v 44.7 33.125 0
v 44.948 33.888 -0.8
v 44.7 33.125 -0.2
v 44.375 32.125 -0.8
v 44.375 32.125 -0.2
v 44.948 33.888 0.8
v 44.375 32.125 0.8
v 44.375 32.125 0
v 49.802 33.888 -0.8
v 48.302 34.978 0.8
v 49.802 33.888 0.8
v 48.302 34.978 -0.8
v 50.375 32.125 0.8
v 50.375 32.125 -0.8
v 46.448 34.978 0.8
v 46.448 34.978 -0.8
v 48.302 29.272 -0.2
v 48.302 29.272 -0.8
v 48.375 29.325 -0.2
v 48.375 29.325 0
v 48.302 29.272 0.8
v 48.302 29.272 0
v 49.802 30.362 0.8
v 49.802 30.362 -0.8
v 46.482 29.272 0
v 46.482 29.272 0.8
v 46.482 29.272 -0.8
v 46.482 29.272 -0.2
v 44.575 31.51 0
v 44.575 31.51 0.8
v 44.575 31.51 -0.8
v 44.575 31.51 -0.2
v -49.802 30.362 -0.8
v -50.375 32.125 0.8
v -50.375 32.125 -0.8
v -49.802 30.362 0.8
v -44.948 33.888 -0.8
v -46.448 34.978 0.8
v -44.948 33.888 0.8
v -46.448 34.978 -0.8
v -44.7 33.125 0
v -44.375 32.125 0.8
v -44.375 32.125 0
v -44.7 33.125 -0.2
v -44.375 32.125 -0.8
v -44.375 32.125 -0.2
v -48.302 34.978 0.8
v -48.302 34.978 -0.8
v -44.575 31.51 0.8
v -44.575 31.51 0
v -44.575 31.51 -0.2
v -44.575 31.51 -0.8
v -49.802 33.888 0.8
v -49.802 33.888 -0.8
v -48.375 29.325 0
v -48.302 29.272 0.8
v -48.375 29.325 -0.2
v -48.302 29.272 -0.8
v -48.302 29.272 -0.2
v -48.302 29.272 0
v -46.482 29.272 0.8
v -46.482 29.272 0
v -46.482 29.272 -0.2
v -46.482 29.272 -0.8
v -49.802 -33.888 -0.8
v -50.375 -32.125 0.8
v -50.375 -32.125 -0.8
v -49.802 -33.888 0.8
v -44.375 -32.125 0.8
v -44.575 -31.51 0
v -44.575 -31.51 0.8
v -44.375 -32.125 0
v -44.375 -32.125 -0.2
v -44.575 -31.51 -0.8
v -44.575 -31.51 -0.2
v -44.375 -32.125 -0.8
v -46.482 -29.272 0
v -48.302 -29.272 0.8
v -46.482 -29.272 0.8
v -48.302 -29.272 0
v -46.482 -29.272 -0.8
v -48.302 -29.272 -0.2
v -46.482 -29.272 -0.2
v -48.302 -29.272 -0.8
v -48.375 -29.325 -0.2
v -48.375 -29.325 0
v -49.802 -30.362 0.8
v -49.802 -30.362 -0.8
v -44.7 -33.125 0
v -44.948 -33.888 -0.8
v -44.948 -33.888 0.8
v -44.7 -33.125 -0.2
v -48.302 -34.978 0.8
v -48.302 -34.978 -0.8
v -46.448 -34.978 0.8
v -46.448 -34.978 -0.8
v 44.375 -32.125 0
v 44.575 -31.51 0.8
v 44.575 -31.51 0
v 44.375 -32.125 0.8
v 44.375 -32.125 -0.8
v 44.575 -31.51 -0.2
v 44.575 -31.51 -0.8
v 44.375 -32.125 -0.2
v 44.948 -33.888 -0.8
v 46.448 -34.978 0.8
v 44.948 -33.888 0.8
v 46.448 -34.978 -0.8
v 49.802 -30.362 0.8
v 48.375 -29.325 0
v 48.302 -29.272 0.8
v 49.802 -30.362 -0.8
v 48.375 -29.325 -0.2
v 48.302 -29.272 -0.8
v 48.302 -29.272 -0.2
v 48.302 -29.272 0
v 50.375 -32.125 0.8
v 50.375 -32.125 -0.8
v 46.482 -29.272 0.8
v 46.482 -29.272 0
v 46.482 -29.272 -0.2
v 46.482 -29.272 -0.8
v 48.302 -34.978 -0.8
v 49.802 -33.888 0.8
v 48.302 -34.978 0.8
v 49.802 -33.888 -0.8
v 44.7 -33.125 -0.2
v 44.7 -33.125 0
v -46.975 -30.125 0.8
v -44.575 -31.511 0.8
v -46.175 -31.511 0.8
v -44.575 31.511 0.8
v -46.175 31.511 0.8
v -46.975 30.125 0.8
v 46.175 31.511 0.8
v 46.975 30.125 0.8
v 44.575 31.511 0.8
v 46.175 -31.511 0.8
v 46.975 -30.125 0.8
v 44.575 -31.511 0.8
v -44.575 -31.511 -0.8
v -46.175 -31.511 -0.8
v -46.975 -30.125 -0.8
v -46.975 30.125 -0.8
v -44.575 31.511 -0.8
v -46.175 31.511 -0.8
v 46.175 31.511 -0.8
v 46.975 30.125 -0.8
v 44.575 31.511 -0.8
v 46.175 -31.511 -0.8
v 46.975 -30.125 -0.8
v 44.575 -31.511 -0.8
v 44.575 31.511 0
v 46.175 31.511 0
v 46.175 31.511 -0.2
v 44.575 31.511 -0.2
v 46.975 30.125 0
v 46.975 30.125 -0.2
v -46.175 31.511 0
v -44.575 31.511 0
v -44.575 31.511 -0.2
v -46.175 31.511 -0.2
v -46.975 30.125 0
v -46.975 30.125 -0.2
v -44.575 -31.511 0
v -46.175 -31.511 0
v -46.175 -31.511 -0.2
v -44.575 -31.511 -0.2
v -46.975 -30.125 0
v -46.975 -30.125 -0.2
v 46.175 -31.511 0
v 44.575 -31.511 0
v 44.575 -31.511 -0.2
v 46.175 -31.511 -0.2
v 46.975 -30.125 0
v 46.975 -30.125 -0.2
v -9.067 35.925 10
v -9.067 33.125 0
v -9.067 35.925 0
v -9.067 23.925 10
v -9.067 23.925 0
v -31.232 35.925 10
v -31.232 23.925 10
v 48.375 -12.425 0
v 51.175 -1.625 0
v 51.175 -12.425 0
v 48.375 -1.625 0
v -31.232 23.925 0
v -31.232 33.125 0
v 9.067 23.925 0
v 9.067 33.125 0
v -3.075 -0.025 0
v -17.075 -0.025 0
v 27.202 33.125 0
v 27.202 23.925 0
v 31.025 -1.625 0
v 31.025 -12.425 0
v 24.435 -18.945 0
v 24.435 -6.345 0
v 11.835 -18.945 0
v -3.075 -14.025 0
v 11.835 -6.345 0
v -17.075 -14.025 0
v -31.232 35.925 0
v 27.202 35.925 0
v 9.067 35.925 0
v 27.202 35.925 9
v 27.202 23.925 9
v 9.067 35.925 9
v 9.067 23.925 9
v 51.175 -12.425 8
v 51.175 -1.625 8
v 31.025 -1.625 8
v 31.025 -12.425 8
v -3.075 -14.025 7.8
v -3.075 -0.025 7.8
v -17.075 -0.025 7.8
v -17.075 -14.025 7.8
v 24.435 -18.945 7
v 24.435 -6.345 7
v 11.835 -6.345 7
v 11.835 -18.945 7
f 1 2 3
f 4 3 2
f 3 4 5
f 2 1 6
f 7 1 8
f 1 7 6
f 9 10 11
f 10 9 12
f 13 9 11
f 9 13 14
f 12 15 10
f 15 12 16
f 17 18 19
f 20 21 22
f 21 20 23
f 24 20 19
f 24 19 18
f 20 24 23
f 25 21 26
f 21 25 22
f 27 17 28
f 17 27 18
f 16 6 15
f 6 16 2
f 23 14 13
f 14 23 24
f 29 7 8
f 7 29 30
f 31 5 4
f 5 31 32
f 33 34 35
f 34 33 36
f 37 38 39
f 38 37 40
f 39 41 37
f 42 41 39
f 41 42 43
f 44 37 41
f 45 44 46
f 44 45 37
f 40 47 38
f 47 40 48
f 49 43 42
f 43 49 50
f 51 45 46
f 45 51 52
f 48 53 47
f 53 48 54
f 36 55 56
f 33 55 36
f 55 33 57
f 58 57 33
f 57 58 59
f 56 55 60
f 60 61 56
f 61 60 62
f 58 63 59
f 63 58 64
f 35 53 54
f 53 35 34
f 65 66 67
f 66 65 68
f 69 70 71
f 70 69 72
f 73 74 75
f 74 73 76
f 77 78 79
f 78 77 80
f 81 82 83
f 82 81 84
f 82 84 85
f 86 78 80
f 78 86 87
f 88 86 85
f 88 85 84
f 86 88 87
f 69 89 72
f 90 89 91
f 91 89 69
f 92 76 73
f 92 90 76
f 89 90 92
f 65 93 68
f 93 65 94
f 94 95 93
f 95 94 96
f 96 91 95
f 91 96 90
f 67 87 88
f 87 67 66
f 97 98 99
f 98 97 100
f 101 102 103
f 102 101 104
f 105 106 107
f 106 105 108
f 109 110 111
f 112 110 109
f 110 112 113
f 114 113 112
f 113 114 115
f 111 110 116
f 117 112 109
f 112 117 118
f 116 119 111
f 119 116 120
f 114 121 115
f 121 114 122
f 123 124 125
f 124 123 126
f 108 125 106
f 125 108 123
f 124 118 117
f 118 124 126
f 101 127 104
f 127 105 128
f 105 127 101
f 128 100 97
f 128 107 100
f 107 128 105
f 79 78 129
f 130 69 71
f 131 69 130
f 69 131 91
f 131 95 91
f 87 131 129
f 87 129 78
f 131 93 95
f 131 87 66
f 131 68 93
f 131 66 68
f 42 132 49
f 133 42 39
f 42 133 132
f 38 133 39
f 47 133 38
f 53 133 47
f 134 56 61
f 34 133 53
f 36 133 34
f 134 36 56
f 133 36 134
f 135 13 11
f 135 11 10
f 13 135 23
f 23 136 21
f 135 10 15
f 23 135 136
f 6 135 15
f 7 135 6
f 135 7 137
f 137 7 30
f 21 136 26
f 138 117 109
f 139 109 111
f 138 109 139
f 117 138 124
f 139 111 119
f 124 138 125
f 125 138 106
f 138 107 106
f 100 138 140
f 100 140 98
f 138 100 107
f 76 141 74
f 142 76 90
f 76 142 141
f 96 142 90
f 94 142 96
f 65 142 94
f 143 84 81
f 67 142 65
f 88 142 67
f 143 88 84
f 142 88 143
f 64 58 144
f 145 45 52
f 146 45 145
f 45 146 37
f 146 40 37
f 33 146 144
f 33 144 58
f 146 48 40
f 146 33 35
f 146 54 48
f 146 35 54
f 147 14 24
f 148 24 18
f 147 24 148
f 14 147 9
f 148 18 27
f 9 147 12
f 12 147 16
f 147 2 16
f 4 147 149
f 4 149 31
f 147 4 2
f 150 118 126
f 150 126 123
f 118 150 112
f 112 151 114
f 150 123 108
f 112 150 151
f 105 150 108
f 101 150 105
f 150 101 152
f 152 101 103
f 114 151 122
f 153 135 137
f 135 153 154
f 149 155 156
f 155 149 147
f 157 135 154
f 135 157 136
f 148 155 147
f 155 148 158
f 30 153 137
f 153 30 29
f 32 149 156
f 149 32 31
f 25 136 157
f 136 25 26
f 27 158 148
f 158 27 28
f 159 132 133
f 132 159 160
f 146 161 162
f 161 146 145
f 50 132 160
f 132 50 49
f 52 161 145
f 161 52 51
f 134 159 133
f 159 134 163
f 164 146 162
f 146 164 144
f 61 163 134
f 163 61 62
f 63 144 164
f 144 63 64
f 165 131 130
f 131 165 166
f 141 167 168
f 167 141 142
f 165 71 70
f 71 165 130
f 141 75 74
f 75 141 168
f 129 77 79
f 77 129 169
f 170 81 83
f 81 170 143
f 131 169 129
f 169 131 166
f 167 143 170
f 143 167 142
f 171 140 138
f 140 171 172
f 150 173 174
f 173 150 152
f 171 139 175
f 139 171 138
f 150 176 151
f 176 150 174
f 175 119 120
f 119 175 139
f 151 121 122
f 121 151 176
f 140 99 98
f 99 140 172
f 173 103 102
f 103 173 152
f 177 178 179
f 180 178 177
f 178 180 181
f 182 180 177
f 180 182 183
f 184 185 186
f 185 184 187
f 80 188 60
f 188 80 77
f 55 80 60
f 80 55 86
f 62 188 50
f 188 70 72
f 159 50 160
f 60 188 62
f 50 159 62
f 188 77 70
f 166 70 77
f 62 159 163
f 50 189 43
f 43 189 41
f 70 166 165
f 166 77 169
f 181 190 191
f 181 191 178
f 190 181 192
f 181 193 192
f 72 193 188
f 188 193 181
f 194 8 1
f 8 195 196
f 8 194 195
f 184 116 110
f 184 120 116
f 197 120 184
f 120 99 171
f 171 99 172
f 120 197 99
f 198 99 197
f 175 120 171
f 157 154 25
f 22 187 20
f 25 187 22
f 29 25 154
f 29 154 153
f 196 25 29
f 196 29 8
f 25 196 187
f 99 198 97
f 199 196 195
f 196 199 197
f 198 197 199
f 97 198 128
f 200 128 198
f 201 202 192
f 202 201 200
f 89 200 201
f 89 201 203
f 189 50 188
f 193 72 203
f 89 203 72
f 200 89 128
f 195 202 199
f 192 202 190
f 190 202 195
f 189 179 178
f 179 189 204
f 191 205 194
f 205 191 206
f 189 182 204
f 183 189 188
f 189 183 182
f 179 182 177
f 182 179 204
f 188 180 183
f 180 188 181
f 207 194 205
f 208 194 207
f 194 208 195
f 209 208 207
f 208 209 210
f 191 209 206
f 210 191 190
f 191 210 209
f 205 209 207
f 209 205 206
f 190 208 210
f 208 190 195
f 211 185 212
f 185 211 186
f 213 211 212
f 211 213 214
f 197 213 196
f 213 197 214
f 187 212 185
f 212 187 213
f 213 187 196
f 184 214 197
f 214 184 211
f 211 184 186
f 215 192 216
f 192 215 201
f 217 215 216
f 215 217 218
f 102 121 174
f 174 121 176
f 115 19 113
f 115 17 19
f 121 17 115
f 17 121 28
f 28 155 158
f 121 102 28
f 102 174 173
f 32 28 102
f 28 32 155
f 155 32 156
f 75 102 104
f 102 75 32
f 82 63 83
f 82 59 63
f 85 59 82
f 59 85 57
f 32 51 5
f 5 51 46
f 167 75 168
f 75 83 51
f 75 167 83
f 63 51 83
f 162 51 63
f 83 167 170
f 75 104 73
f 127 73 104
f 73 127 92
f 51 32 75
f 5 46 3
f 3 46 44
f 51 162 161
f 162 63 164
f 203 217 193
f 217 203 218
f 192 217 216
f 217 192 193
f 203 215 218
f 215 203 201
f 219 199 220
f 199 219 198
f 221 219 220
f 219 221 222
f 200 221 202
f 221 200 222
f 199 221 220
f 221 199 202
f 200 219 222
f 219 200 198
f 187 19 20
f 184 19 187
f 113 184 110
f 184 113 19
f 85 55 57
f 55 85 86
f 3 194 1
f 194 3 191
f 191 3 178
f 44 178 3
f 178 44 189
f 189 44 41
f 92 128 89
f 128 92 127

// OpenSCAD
// Parameters
pcb_length = 100.75; //[50.375:201.5:0.25]
pcb_width = 70.25; //[35.125:140.5:0.25]
pcb_thickness = 1.6; //[0.8:3.2:0.1]
corner_radius = 3.0; //[1.0:8.0:0.5]
hole_diameter = 3.2; //[2.0:6.0:0.1]
hole_edge_offset = 5.0; //[3.0:12.0:0.5]
hole_cut_extra_z = 0.6; //[0.2:2.0:0.1]
overlap = 1.0; //[0.5:2.0:0.1]
connector_height = 10.0; //[5.0:20.0:0.5]
connector_depth = 12.0; //[6.0:25.0:0.5]
connector_wall_overlap = 0.8; //[0.5:2.0:0.1]
heatsink_size_x = 14.0; //[8.0:28.0:0.5]
heatsink_size_y = 14.0; //[8.0:28.0:0.5]
heatsink_height = 8.0; //[3.0:20.0:0.5]
mask_thickness = 0.2; //[0.05:0.6:0.05]
mask_margin = 2.0; //[0.5:6.0:0.5]

// Mainboard PCB with rounded corners and mounting holes
module pcb_mainboard() {
  color([0.0, 0.4, 0.2]) // Green for PCB
  difference() {
    intersection() {
      // Main PCB rectangle
      cube([pcb_length, pcb_width, pcb_thickness], center=true);
      
      // Corner rounding
      union() {
        translate([pcb_length/2 - corner_radius, pcb_width/2 - corner_radius, 0])
          cylinder(r=corner_radius, h=pcb_thickness + 2*overlap, center=true);
        translate([-pcb_length/2 + corner_radius, pcb_width/2 - corner_radius, 0])
          cylinder(r=corner_radius, h=pcb_thickness + 2*overlap, center=true);
        translate([-pcb_length/2 + corner_radius, -pcb_width/2 + corner_radius, 0])
          cylinder(r=corner_radius, h=pcb_thickness + 2*overlap, center=true);
        translate([pcb_length/2 - corner_radius, -pcb_width/2 + corner_radius, 0])
          cylinder(r=corner_radius, h=pcb_thickness + 2*overlap, center=true);
      }
    }
    
    // Mounting holes
    union() {
      translate([pcb_length/2 - hole_edge_offset, pcb_width/2 - hole_edge_offset, 0])
        cylinder(r=hole_diameter/2, h=pcb_thickness + hole_cut_extra_z, center=true);
      translate([-pcb_length/2 + hole_edge_offset, pcb_width/2 - hole_edge_offset, 0])
        cylinder(r=hole_diameter/2, h=pcb_thickness + hole_cut_extra_z, center=true);
      translate([-pcb_length/2 + hole_edge_offset, -pcb_width/2 + hole_edge_offset, 0])
        cylinder(r=hole_diameter/2, h=pcb_thickness + hole_cut_extra_z, center=true);
      translate([pcb_length/2 - hole_edge_offset, -pcb_width/2 + hole_edge_offset, 0])
        cylinder(r=hole_diameter/2, h=pcb_thickness + hole_cut_extra_z, center=true);
    }
  }
}

// Connectors
module connectors() {
  color([0.85, 0.85, 0.8]) // Off-white for connectors
  union() {
    translate([-pcb_length*0.20, pcb_width/2 - connector_depth/2 + connector_wall_overlap, pcb_thickness/2 + connector_height/2 - connector_wall_overlap])
      cube([pcb_length*0.22, connector_depth, connector_height], center=true);
    translate([pcb_length*0.18, pcb_width/2 - connector_depth/2 + connector_wall_overlap, pcb_thickness/2 + (connector_height*0.9)/2 - connector_wall_overlap])
      cube([pcb_length*0.18, connector_depth, connector_height*0.9], center=true);
    translate([pcb_length/2 - (pcb_length*0.20)/2 + connector_wall_overlap, -pcb_width*0.10, pcb_thickness/2 + (connector_height*0.8)/2 - connector_wall_overlap])
      cube([pcb_length*0.20, connector_depth*0.9, connector_height*0.8], center=true);
  }
}

// Heatsinks
module heatsinks() {
  color([0.4, 0.4, 0.43]) // DimGray for heatsinks
  union() {
    translate([-pcb_length*0.10, -pcb_width*0.10, pcb_thickness/2 + heatsink_height/2 - overlap])
      cube([heatsink_size_x, heatsink_size_y, heatsink_height], center=true);
    translate([pcb_length*0.18, -pcb_width*0.18, pcb_thickness/2 + (heatsink_height*0.9)/2 - overlap])
      cube([heatsink_size_x*0.9, heatsink_size_y*0.9, heatsink_height*0.9], center=true);
  }
}

// Solder mask detail
module solder_mask_detail() {
  color([0.1, 0.1, 0.6]) // Blue for solder mask
  translate([0, 0, pcb_thickness/2 + mask_thickness/2 - overlap])
    cube([pcb_length - 2*mask_margin, pcb_width - 2*mask_margin, mask_thickness], center=true);
}

// Complete mainboard model
module complete_mainboard_model() {
  union() {
    pcb_mainboard();
    connectors();
    heatsinks();
    solder_mask_detail();
  }
}

// Render the complete model
complete_mainboard_model();
